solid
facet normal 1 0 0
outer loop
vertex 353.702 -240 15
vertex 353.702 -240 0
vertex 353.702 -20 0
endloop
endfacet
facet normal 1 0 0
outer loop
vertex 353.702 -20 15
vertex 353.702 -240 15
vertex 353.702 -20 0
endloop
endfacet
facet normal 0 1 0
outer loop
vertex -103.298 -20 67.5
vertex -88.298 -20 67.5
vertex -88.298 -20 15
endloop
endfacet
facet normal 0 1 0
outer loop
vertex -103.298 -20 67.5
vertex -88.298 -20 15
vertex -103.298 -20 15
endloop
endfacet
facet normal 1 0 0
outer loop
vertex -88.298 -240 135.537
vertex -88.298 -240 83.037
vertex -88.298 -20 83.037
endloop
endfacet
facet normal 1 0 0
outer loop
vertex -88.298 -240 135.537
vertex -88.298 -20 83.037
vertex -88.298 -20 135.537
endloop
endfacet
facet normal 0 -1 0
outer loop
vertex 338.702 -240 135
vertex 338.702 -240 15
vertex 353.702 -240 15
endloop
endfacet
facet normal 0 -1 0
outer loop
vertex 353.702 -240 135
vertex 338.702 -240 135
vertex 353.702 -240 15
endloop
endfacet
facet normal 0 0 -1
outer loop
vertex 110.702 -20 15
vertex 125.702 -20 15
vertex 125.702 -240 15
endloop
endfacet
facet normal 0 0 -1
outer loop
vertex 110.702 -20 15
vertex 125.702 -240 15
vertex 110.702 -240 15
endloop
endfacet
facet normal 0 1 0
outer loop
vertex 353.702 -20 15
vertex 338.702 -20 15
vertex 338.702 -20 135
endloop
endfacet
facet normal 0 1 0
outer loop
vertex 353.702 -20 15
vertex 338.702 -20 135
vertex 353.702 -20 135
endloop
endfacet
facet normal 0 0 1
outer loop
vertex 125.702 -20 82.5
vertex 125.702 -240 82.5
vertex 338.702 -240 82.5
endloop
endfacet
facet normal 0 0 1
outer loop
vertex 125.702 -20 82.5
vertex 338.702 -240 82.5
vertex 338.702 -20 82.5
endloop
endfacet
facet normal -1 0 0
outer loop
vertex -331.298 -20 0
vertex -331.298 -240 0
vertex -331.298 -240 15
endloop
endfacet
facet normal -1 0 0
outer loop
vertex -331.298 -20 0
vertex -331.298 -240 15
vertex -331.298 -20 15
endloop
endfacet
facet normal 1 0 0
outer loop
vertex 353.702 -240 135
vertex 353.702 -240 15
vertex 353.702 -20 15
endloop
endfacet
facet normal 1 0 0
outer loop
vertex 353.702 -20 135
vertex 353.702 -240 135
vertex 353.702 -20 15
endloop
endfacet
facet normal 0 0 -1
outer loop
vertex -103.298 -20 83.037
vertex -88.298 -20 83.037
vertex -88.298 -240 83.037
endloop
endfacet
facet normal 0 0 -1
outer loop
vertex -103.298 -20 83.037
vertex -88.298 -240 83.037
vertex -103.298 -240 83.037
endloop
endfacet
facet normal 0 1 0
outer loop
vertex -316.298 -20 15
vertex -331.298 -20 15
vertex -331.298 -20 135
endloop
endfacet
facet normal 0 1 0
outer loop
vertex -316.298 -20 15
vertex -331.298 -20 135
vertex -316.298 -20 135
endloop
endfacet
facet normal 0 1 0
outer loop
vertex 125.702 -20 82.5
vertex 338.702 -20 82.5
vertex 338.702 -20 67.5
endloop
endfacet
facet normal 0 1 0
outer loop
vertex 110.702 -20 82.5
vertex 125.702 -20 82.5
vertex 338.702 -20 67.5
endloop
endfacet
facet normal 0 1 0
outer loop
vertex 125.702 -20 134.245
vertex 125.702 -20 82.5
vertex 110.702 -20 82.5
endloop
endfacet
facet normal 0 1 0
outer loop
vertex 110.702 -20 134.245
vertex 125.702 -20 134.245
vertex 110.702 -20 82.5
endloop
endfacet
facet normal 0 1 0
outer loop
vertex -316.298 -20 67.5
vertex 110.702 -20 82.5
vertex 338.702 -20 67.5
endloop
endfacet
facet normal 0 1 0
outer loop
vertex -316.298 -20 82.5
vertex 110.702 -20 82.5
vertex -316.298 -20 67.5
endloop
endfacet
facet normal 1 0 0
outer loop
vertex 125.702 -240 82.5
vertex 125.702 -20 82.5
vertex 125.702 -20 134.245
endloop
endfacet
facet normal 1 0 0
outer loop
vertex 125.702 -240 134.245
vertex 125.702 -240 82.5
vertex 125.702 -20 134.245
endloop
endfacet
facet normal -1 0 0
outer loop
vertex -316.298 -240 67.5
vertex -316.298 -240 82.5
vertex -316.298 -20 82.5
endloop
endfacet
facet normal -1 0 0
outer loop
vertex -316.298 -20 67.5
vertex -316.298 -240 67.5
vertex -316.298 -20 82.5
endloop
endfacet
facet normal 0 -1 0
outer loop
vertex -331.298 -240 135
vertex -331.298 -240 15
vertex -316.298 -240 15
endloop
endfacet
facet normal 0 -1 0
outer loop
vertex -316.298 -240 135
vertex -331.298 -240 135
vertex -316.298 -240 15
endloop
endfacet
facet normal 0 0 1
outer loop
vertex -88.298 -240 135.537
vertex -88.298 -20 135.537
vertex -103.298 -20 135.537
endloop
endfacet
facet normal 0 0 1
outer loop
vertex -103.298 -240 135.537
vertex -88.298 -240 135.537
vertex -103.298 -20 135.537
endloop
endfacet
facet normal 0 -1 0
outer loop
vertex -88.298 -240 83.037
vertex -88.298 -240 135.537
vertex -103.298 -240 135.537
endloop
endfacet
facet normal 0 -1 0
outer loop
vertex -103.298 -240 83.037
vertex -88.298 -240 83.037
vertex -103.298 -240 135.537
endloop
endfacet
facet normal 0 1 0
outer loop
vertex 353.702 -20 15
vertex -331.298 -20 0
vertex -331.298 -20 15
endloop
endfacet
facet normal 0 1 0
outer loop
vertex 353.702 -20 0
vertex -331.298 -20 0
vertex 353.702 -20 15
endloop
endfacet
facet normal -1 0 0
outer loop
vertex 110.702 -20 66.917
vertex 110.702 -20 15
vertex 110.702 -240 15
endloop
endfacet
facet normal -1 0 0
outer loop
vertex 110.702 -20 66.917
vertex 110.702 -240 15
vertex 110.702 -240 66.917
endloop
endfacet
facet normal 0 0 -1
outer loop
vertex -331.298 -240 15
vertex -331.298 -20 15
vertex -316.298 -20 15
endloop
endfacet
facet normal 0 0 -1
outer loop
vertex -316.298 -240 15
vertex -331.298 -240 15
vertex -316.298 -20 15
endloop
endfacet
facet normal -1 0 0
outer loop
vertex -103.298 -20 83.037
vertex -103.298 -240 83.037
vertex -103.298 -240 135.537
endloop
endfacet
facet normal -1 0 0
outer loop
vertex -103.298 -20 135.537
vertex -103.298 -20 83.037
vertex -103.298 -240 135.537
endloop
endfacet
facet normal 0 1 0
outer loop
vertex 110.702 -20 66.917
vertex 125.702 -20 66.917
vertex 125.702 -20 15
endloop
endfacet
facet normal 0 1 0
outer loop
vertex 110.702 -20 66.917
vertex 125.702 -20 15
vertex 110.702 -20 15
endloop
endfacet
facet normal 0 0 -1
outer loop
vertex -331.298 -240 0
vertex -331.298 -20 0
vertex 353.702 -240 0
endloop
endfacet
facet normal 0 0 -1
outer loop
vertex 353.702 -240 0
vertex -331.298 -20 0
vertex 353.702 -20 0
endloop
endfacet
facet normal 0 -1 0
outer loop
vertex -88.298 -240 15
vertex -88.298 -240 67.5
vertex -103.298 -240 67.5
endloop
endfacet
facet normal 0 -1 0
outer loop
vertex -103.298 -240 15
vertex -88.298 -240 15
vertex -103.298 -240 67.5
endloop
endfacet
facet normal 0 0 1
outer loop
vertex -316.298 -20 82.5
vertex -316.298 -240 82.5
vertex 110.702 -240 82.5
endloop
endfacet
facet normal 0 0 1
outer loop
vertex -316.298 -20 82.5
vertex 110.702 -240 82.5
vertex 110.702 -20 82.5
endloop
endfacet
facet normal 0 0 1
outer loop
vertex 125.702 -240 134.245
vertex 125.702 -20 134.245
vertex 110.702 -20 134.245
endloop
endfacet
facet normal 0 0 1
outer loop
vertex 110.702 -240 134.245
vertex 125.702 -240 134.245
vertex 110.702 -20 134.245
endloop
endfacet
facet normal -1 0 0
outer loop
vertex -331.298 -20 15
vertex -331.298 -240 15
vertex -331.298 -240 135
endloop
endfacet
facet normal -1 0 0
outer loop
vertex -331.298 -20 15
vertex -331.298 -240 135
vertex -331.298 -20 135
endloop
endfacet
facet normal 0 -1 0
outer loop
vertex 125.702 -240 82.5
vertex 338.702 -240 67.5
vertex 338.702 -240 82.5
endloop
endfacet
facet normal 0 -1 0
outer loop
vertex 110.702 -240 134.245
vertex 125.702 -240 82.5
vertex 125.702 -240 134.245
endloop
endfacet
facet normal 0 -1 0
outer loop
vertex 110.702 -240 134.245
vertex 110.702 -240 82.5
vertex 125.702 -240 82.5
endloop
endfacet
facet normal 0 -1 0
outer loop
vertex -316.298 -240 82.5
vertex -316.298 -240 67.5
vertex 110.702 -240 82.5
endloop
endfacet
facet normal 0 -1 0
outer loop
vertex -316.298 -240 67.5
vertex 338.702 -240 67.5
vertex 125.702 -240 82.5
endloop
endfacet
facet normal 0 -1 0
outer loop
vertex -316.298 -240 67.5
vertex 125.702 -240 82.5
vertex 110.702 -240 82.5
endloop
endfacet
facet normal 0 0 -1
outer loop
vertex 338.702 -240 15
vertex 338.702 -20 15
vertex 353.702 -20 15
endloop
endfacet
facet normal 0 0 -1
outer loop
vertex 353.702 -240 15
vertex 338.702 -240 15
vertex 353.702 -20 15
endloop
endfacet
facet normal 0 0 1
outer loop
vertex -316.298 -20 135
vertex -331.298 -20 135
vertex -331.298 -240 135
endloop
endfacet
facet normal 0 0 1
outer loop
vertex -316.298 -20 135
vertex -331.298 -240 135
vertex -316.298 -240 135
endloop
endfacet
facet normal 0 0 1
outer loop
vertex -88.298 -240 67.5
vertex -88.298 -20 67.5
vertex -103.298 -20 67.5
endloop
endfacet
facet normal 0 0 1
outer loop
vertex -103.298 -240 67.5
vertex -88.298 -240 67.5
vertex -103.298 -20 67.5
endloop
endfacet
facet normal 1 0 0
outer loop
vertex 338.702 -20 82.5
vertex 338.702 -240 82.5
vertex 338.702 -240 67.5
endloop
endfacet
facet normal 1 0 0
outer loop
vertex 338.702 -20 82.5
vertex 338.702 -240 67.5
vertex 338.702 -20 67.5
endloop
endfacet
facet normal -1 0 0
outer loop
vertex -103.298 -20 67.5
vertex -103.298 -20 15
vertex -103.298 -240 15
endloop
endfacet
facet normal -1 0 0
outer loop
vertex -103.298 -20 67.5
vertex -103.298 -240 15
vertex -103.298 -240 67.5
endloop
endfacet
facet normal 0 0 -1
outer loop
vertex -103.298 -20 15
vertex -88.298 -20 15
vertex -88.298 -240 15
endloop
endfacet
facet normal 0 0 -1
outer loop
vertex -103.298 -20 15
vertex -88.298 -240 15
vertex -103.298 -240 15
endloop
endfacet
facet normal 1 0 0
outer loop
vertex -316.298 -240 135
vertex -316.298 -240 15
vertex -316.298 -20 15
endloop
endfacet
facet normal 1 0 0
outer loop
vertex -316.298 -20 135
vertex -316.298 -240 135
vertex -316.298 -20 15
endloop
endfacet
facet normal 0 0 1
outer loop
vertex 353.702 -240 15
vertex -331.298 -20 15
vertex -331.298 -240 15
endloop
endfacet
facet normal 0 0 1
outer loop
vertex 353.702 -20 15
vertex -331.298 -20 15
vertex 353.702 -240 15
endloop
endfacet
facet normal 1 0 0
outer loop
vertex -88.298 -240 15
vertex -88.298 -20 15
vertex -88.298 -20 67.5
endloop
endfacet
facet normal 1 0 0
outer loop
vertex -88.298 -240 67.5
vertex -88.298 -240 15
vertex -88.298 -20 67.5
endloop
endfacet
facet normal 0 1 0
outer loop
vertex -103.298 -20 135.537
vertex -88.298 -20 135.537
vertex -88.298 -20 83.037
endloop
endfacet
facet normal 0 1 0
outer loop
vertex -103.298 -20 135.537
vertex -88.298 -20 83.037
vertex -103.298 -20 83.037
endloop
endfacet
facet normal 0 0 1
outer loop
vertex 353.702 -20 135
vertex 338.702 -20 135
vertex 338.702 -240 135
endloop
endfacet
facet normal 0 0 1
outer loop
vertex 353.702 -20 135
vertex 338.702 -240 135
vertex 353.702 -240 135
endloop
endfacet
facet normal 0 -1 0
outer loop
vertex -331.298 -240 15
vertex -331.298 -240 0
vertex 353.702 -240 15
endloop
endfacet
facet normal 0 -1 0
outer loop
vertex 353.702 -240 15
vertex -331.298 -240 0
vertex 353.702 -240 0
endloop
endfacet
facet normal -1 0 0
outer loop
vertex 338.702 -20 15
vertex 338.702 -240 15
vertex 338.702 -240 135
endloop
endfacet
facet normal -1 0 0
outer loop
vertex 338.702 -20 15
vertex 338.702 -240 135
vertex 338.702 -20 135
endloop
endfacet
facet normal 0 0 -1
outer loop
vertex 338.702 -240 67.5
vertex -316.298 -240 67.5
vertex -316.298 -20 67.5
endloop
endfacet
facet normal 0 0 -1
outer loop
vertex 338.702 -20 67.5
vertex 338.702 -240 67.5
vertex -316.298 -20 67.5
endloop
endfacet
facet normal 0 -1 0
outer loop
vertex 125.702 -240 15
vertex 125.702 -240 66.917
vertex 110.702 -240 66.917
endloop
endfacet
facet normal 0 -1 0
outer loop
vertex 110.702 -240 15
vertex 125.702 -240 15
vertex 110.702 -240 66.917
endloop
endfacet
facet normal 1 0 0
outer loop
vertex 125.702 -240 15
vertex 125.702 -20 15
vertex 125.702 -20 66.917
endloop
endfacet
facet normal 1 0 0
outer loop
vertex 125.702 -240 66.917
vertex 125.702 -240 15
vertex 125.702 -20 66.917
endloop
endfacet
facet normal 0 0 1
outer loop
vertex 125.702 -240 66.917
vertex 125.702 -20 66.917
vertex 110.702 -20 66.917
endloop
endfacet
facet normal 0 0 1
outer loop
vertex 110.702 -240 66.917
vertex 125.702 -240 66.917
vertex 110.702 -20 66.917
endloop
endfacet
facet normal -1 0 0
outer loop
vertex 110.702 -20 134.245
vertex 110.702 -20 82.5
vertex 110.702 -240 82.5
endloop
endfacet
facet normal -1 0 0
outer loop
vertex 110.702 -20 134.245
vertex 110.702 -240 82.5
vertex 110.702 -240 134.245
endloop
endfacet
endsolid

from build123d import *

# Parameters (mm, degrees)
F0_W      = 685
F0_H      = 220
F1_DEPTH  = 15
F2_W      = 15
F2_H      = 220
F3_DEPTH  = 120
F4_W      = 15
F4_H      = 220
F5_DEPTH  = 120
F6_W      = 220
F6_H      = 15
F7_DEPTH  = 655
F8_W      = 15
F8_H      = 51.917144
F8_H_2    = 52.500003
F9_DEPTH  = 220
F10_W     = 15
F10_H     = 51.744535
F10_H_2   = 52.500002
F11_DEPTH = 220


with BuildPart() as f1:
    # F0 (on Top) → F1 (new body)
    with BuildSketch(Plane.XY):
        with Locations((11.202171, -130.000433)):
            Rectangle(F0_W, F0_H)
    extrude(amount=F1_DEPTH)


with BuildPart() as f3:
    # F2 (on face) → F3 (new body)
    with BuildSketch(Plane.XY.offset(15)):
        with Locations((-323.797829, -130.000433)):
            Rectangle(F2_W, F2_H)
    extrude(amount=F3_DEPTH)


with BuildPart() as f5:
    # F4 (on face) → F5 (new body)
    with BuildSketch(Plane.XY.offset(15)):
        with Locations((346.202171, -130.000433)):
            Rectangle(F4_W, F4_H)
    extrude(amount=F5_DEPTH)


with BuildPart() as f7:
    # F6 (on face) → F7 (new body, through all)
    with BuildSketch(Plane.YZ.offset(-316.297829)):
        with Locations((-130.000433, 75)):
            Rectangle(F6_W, F6_H)
    extrude(amount=F7_DEPTH)

    # F10 (on face) → F11 (join)
    with BuildSketch(Plane(origin=(0, -20.000433, 0), x_dir=(-1, 0, 0), z_dir=(0, 1, 0))):
        with Locations((-118.202171, 108.372267)):
            Rectangle(F10_W, F10_H)
        with Locations((95.797829, 109.286707)):
            Rectangle(F10_W, F10_H_2)
    extrude(amount=-F11_DEPTH)


with BuildPart() as f9:
    # F8 (on face) → F9 (new body)
    with BuildSketch(Plane(origin=(0, -20.000433, 0), x_dir=(-1, 0, 0), z_dir=(0, 1, 0))):
        with Locations((-118.202171, 40.958572)):
            Rectangle(F8_W, F8_H)
        with Locations((95.797829, 41.250001)):
            Rectangle(F8_W, F8_H_2)
    extrude(amount=-F9_DEPTH)


solid = Compound([f1.part, f3.part, f5.part, f7.part, f9.part])
